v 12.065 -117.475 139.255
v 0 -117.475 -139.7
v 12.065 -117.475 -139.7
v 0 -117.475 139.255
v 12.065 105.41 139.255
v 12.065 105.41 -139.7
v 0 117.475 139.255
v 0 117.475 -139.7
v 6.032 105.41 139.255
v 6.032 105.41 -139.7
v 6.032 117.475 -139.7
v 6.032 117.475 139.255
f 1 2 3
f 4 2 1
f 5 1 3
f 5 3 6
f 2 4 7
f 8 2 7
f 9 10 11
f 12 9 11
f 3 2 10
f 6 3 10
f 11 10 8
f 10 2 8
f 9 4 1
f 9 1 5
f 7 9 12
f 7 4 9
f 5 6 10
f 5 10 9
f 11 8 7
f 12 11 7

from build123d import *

# Parameters (mm, degrees)
F0_W     = 234.95
F0_H     = 279.4
F2_DEPTH = 12.065
F3_W     = 12.065
F3_H     = 279.4
F4_DEPTH = 6.0325
F5_DEPTH = 0.4445


# Not quite as in the source:
# - a variable given as a bare number and used for a length is read in inches; the dataset says mm whatever the document's units were


with BuildPart() as f2:
    # F0 (on Right) → F2 (new body)
    with BuildSketch(Plane.YZ):
        Rectangle(F0_W, F0_H)
    extrude(amount=F2_DEPTH)

    # F3 (on face) → F4 (cut)
    with BuildSketch(Plane.YZ.offset(12.065)):
        with Locations((111.4425, 0)):
            Rectangle(F3_W, F3_H)
    extrude(amount=-F4_DEPTH, mode=Mode.SUBTRACT)

    # F5 (cut): a face of the model
    f5_faces = [f2.faces().sort_by_distance(p)[0] for p in [
        (5.9530149098, -2.9367649098, 139.7),
    ]]
    extrude(f5_faces, amount=-F5_DEPTH, mode=Mode.SUBTRACT)


solid = f2.part
